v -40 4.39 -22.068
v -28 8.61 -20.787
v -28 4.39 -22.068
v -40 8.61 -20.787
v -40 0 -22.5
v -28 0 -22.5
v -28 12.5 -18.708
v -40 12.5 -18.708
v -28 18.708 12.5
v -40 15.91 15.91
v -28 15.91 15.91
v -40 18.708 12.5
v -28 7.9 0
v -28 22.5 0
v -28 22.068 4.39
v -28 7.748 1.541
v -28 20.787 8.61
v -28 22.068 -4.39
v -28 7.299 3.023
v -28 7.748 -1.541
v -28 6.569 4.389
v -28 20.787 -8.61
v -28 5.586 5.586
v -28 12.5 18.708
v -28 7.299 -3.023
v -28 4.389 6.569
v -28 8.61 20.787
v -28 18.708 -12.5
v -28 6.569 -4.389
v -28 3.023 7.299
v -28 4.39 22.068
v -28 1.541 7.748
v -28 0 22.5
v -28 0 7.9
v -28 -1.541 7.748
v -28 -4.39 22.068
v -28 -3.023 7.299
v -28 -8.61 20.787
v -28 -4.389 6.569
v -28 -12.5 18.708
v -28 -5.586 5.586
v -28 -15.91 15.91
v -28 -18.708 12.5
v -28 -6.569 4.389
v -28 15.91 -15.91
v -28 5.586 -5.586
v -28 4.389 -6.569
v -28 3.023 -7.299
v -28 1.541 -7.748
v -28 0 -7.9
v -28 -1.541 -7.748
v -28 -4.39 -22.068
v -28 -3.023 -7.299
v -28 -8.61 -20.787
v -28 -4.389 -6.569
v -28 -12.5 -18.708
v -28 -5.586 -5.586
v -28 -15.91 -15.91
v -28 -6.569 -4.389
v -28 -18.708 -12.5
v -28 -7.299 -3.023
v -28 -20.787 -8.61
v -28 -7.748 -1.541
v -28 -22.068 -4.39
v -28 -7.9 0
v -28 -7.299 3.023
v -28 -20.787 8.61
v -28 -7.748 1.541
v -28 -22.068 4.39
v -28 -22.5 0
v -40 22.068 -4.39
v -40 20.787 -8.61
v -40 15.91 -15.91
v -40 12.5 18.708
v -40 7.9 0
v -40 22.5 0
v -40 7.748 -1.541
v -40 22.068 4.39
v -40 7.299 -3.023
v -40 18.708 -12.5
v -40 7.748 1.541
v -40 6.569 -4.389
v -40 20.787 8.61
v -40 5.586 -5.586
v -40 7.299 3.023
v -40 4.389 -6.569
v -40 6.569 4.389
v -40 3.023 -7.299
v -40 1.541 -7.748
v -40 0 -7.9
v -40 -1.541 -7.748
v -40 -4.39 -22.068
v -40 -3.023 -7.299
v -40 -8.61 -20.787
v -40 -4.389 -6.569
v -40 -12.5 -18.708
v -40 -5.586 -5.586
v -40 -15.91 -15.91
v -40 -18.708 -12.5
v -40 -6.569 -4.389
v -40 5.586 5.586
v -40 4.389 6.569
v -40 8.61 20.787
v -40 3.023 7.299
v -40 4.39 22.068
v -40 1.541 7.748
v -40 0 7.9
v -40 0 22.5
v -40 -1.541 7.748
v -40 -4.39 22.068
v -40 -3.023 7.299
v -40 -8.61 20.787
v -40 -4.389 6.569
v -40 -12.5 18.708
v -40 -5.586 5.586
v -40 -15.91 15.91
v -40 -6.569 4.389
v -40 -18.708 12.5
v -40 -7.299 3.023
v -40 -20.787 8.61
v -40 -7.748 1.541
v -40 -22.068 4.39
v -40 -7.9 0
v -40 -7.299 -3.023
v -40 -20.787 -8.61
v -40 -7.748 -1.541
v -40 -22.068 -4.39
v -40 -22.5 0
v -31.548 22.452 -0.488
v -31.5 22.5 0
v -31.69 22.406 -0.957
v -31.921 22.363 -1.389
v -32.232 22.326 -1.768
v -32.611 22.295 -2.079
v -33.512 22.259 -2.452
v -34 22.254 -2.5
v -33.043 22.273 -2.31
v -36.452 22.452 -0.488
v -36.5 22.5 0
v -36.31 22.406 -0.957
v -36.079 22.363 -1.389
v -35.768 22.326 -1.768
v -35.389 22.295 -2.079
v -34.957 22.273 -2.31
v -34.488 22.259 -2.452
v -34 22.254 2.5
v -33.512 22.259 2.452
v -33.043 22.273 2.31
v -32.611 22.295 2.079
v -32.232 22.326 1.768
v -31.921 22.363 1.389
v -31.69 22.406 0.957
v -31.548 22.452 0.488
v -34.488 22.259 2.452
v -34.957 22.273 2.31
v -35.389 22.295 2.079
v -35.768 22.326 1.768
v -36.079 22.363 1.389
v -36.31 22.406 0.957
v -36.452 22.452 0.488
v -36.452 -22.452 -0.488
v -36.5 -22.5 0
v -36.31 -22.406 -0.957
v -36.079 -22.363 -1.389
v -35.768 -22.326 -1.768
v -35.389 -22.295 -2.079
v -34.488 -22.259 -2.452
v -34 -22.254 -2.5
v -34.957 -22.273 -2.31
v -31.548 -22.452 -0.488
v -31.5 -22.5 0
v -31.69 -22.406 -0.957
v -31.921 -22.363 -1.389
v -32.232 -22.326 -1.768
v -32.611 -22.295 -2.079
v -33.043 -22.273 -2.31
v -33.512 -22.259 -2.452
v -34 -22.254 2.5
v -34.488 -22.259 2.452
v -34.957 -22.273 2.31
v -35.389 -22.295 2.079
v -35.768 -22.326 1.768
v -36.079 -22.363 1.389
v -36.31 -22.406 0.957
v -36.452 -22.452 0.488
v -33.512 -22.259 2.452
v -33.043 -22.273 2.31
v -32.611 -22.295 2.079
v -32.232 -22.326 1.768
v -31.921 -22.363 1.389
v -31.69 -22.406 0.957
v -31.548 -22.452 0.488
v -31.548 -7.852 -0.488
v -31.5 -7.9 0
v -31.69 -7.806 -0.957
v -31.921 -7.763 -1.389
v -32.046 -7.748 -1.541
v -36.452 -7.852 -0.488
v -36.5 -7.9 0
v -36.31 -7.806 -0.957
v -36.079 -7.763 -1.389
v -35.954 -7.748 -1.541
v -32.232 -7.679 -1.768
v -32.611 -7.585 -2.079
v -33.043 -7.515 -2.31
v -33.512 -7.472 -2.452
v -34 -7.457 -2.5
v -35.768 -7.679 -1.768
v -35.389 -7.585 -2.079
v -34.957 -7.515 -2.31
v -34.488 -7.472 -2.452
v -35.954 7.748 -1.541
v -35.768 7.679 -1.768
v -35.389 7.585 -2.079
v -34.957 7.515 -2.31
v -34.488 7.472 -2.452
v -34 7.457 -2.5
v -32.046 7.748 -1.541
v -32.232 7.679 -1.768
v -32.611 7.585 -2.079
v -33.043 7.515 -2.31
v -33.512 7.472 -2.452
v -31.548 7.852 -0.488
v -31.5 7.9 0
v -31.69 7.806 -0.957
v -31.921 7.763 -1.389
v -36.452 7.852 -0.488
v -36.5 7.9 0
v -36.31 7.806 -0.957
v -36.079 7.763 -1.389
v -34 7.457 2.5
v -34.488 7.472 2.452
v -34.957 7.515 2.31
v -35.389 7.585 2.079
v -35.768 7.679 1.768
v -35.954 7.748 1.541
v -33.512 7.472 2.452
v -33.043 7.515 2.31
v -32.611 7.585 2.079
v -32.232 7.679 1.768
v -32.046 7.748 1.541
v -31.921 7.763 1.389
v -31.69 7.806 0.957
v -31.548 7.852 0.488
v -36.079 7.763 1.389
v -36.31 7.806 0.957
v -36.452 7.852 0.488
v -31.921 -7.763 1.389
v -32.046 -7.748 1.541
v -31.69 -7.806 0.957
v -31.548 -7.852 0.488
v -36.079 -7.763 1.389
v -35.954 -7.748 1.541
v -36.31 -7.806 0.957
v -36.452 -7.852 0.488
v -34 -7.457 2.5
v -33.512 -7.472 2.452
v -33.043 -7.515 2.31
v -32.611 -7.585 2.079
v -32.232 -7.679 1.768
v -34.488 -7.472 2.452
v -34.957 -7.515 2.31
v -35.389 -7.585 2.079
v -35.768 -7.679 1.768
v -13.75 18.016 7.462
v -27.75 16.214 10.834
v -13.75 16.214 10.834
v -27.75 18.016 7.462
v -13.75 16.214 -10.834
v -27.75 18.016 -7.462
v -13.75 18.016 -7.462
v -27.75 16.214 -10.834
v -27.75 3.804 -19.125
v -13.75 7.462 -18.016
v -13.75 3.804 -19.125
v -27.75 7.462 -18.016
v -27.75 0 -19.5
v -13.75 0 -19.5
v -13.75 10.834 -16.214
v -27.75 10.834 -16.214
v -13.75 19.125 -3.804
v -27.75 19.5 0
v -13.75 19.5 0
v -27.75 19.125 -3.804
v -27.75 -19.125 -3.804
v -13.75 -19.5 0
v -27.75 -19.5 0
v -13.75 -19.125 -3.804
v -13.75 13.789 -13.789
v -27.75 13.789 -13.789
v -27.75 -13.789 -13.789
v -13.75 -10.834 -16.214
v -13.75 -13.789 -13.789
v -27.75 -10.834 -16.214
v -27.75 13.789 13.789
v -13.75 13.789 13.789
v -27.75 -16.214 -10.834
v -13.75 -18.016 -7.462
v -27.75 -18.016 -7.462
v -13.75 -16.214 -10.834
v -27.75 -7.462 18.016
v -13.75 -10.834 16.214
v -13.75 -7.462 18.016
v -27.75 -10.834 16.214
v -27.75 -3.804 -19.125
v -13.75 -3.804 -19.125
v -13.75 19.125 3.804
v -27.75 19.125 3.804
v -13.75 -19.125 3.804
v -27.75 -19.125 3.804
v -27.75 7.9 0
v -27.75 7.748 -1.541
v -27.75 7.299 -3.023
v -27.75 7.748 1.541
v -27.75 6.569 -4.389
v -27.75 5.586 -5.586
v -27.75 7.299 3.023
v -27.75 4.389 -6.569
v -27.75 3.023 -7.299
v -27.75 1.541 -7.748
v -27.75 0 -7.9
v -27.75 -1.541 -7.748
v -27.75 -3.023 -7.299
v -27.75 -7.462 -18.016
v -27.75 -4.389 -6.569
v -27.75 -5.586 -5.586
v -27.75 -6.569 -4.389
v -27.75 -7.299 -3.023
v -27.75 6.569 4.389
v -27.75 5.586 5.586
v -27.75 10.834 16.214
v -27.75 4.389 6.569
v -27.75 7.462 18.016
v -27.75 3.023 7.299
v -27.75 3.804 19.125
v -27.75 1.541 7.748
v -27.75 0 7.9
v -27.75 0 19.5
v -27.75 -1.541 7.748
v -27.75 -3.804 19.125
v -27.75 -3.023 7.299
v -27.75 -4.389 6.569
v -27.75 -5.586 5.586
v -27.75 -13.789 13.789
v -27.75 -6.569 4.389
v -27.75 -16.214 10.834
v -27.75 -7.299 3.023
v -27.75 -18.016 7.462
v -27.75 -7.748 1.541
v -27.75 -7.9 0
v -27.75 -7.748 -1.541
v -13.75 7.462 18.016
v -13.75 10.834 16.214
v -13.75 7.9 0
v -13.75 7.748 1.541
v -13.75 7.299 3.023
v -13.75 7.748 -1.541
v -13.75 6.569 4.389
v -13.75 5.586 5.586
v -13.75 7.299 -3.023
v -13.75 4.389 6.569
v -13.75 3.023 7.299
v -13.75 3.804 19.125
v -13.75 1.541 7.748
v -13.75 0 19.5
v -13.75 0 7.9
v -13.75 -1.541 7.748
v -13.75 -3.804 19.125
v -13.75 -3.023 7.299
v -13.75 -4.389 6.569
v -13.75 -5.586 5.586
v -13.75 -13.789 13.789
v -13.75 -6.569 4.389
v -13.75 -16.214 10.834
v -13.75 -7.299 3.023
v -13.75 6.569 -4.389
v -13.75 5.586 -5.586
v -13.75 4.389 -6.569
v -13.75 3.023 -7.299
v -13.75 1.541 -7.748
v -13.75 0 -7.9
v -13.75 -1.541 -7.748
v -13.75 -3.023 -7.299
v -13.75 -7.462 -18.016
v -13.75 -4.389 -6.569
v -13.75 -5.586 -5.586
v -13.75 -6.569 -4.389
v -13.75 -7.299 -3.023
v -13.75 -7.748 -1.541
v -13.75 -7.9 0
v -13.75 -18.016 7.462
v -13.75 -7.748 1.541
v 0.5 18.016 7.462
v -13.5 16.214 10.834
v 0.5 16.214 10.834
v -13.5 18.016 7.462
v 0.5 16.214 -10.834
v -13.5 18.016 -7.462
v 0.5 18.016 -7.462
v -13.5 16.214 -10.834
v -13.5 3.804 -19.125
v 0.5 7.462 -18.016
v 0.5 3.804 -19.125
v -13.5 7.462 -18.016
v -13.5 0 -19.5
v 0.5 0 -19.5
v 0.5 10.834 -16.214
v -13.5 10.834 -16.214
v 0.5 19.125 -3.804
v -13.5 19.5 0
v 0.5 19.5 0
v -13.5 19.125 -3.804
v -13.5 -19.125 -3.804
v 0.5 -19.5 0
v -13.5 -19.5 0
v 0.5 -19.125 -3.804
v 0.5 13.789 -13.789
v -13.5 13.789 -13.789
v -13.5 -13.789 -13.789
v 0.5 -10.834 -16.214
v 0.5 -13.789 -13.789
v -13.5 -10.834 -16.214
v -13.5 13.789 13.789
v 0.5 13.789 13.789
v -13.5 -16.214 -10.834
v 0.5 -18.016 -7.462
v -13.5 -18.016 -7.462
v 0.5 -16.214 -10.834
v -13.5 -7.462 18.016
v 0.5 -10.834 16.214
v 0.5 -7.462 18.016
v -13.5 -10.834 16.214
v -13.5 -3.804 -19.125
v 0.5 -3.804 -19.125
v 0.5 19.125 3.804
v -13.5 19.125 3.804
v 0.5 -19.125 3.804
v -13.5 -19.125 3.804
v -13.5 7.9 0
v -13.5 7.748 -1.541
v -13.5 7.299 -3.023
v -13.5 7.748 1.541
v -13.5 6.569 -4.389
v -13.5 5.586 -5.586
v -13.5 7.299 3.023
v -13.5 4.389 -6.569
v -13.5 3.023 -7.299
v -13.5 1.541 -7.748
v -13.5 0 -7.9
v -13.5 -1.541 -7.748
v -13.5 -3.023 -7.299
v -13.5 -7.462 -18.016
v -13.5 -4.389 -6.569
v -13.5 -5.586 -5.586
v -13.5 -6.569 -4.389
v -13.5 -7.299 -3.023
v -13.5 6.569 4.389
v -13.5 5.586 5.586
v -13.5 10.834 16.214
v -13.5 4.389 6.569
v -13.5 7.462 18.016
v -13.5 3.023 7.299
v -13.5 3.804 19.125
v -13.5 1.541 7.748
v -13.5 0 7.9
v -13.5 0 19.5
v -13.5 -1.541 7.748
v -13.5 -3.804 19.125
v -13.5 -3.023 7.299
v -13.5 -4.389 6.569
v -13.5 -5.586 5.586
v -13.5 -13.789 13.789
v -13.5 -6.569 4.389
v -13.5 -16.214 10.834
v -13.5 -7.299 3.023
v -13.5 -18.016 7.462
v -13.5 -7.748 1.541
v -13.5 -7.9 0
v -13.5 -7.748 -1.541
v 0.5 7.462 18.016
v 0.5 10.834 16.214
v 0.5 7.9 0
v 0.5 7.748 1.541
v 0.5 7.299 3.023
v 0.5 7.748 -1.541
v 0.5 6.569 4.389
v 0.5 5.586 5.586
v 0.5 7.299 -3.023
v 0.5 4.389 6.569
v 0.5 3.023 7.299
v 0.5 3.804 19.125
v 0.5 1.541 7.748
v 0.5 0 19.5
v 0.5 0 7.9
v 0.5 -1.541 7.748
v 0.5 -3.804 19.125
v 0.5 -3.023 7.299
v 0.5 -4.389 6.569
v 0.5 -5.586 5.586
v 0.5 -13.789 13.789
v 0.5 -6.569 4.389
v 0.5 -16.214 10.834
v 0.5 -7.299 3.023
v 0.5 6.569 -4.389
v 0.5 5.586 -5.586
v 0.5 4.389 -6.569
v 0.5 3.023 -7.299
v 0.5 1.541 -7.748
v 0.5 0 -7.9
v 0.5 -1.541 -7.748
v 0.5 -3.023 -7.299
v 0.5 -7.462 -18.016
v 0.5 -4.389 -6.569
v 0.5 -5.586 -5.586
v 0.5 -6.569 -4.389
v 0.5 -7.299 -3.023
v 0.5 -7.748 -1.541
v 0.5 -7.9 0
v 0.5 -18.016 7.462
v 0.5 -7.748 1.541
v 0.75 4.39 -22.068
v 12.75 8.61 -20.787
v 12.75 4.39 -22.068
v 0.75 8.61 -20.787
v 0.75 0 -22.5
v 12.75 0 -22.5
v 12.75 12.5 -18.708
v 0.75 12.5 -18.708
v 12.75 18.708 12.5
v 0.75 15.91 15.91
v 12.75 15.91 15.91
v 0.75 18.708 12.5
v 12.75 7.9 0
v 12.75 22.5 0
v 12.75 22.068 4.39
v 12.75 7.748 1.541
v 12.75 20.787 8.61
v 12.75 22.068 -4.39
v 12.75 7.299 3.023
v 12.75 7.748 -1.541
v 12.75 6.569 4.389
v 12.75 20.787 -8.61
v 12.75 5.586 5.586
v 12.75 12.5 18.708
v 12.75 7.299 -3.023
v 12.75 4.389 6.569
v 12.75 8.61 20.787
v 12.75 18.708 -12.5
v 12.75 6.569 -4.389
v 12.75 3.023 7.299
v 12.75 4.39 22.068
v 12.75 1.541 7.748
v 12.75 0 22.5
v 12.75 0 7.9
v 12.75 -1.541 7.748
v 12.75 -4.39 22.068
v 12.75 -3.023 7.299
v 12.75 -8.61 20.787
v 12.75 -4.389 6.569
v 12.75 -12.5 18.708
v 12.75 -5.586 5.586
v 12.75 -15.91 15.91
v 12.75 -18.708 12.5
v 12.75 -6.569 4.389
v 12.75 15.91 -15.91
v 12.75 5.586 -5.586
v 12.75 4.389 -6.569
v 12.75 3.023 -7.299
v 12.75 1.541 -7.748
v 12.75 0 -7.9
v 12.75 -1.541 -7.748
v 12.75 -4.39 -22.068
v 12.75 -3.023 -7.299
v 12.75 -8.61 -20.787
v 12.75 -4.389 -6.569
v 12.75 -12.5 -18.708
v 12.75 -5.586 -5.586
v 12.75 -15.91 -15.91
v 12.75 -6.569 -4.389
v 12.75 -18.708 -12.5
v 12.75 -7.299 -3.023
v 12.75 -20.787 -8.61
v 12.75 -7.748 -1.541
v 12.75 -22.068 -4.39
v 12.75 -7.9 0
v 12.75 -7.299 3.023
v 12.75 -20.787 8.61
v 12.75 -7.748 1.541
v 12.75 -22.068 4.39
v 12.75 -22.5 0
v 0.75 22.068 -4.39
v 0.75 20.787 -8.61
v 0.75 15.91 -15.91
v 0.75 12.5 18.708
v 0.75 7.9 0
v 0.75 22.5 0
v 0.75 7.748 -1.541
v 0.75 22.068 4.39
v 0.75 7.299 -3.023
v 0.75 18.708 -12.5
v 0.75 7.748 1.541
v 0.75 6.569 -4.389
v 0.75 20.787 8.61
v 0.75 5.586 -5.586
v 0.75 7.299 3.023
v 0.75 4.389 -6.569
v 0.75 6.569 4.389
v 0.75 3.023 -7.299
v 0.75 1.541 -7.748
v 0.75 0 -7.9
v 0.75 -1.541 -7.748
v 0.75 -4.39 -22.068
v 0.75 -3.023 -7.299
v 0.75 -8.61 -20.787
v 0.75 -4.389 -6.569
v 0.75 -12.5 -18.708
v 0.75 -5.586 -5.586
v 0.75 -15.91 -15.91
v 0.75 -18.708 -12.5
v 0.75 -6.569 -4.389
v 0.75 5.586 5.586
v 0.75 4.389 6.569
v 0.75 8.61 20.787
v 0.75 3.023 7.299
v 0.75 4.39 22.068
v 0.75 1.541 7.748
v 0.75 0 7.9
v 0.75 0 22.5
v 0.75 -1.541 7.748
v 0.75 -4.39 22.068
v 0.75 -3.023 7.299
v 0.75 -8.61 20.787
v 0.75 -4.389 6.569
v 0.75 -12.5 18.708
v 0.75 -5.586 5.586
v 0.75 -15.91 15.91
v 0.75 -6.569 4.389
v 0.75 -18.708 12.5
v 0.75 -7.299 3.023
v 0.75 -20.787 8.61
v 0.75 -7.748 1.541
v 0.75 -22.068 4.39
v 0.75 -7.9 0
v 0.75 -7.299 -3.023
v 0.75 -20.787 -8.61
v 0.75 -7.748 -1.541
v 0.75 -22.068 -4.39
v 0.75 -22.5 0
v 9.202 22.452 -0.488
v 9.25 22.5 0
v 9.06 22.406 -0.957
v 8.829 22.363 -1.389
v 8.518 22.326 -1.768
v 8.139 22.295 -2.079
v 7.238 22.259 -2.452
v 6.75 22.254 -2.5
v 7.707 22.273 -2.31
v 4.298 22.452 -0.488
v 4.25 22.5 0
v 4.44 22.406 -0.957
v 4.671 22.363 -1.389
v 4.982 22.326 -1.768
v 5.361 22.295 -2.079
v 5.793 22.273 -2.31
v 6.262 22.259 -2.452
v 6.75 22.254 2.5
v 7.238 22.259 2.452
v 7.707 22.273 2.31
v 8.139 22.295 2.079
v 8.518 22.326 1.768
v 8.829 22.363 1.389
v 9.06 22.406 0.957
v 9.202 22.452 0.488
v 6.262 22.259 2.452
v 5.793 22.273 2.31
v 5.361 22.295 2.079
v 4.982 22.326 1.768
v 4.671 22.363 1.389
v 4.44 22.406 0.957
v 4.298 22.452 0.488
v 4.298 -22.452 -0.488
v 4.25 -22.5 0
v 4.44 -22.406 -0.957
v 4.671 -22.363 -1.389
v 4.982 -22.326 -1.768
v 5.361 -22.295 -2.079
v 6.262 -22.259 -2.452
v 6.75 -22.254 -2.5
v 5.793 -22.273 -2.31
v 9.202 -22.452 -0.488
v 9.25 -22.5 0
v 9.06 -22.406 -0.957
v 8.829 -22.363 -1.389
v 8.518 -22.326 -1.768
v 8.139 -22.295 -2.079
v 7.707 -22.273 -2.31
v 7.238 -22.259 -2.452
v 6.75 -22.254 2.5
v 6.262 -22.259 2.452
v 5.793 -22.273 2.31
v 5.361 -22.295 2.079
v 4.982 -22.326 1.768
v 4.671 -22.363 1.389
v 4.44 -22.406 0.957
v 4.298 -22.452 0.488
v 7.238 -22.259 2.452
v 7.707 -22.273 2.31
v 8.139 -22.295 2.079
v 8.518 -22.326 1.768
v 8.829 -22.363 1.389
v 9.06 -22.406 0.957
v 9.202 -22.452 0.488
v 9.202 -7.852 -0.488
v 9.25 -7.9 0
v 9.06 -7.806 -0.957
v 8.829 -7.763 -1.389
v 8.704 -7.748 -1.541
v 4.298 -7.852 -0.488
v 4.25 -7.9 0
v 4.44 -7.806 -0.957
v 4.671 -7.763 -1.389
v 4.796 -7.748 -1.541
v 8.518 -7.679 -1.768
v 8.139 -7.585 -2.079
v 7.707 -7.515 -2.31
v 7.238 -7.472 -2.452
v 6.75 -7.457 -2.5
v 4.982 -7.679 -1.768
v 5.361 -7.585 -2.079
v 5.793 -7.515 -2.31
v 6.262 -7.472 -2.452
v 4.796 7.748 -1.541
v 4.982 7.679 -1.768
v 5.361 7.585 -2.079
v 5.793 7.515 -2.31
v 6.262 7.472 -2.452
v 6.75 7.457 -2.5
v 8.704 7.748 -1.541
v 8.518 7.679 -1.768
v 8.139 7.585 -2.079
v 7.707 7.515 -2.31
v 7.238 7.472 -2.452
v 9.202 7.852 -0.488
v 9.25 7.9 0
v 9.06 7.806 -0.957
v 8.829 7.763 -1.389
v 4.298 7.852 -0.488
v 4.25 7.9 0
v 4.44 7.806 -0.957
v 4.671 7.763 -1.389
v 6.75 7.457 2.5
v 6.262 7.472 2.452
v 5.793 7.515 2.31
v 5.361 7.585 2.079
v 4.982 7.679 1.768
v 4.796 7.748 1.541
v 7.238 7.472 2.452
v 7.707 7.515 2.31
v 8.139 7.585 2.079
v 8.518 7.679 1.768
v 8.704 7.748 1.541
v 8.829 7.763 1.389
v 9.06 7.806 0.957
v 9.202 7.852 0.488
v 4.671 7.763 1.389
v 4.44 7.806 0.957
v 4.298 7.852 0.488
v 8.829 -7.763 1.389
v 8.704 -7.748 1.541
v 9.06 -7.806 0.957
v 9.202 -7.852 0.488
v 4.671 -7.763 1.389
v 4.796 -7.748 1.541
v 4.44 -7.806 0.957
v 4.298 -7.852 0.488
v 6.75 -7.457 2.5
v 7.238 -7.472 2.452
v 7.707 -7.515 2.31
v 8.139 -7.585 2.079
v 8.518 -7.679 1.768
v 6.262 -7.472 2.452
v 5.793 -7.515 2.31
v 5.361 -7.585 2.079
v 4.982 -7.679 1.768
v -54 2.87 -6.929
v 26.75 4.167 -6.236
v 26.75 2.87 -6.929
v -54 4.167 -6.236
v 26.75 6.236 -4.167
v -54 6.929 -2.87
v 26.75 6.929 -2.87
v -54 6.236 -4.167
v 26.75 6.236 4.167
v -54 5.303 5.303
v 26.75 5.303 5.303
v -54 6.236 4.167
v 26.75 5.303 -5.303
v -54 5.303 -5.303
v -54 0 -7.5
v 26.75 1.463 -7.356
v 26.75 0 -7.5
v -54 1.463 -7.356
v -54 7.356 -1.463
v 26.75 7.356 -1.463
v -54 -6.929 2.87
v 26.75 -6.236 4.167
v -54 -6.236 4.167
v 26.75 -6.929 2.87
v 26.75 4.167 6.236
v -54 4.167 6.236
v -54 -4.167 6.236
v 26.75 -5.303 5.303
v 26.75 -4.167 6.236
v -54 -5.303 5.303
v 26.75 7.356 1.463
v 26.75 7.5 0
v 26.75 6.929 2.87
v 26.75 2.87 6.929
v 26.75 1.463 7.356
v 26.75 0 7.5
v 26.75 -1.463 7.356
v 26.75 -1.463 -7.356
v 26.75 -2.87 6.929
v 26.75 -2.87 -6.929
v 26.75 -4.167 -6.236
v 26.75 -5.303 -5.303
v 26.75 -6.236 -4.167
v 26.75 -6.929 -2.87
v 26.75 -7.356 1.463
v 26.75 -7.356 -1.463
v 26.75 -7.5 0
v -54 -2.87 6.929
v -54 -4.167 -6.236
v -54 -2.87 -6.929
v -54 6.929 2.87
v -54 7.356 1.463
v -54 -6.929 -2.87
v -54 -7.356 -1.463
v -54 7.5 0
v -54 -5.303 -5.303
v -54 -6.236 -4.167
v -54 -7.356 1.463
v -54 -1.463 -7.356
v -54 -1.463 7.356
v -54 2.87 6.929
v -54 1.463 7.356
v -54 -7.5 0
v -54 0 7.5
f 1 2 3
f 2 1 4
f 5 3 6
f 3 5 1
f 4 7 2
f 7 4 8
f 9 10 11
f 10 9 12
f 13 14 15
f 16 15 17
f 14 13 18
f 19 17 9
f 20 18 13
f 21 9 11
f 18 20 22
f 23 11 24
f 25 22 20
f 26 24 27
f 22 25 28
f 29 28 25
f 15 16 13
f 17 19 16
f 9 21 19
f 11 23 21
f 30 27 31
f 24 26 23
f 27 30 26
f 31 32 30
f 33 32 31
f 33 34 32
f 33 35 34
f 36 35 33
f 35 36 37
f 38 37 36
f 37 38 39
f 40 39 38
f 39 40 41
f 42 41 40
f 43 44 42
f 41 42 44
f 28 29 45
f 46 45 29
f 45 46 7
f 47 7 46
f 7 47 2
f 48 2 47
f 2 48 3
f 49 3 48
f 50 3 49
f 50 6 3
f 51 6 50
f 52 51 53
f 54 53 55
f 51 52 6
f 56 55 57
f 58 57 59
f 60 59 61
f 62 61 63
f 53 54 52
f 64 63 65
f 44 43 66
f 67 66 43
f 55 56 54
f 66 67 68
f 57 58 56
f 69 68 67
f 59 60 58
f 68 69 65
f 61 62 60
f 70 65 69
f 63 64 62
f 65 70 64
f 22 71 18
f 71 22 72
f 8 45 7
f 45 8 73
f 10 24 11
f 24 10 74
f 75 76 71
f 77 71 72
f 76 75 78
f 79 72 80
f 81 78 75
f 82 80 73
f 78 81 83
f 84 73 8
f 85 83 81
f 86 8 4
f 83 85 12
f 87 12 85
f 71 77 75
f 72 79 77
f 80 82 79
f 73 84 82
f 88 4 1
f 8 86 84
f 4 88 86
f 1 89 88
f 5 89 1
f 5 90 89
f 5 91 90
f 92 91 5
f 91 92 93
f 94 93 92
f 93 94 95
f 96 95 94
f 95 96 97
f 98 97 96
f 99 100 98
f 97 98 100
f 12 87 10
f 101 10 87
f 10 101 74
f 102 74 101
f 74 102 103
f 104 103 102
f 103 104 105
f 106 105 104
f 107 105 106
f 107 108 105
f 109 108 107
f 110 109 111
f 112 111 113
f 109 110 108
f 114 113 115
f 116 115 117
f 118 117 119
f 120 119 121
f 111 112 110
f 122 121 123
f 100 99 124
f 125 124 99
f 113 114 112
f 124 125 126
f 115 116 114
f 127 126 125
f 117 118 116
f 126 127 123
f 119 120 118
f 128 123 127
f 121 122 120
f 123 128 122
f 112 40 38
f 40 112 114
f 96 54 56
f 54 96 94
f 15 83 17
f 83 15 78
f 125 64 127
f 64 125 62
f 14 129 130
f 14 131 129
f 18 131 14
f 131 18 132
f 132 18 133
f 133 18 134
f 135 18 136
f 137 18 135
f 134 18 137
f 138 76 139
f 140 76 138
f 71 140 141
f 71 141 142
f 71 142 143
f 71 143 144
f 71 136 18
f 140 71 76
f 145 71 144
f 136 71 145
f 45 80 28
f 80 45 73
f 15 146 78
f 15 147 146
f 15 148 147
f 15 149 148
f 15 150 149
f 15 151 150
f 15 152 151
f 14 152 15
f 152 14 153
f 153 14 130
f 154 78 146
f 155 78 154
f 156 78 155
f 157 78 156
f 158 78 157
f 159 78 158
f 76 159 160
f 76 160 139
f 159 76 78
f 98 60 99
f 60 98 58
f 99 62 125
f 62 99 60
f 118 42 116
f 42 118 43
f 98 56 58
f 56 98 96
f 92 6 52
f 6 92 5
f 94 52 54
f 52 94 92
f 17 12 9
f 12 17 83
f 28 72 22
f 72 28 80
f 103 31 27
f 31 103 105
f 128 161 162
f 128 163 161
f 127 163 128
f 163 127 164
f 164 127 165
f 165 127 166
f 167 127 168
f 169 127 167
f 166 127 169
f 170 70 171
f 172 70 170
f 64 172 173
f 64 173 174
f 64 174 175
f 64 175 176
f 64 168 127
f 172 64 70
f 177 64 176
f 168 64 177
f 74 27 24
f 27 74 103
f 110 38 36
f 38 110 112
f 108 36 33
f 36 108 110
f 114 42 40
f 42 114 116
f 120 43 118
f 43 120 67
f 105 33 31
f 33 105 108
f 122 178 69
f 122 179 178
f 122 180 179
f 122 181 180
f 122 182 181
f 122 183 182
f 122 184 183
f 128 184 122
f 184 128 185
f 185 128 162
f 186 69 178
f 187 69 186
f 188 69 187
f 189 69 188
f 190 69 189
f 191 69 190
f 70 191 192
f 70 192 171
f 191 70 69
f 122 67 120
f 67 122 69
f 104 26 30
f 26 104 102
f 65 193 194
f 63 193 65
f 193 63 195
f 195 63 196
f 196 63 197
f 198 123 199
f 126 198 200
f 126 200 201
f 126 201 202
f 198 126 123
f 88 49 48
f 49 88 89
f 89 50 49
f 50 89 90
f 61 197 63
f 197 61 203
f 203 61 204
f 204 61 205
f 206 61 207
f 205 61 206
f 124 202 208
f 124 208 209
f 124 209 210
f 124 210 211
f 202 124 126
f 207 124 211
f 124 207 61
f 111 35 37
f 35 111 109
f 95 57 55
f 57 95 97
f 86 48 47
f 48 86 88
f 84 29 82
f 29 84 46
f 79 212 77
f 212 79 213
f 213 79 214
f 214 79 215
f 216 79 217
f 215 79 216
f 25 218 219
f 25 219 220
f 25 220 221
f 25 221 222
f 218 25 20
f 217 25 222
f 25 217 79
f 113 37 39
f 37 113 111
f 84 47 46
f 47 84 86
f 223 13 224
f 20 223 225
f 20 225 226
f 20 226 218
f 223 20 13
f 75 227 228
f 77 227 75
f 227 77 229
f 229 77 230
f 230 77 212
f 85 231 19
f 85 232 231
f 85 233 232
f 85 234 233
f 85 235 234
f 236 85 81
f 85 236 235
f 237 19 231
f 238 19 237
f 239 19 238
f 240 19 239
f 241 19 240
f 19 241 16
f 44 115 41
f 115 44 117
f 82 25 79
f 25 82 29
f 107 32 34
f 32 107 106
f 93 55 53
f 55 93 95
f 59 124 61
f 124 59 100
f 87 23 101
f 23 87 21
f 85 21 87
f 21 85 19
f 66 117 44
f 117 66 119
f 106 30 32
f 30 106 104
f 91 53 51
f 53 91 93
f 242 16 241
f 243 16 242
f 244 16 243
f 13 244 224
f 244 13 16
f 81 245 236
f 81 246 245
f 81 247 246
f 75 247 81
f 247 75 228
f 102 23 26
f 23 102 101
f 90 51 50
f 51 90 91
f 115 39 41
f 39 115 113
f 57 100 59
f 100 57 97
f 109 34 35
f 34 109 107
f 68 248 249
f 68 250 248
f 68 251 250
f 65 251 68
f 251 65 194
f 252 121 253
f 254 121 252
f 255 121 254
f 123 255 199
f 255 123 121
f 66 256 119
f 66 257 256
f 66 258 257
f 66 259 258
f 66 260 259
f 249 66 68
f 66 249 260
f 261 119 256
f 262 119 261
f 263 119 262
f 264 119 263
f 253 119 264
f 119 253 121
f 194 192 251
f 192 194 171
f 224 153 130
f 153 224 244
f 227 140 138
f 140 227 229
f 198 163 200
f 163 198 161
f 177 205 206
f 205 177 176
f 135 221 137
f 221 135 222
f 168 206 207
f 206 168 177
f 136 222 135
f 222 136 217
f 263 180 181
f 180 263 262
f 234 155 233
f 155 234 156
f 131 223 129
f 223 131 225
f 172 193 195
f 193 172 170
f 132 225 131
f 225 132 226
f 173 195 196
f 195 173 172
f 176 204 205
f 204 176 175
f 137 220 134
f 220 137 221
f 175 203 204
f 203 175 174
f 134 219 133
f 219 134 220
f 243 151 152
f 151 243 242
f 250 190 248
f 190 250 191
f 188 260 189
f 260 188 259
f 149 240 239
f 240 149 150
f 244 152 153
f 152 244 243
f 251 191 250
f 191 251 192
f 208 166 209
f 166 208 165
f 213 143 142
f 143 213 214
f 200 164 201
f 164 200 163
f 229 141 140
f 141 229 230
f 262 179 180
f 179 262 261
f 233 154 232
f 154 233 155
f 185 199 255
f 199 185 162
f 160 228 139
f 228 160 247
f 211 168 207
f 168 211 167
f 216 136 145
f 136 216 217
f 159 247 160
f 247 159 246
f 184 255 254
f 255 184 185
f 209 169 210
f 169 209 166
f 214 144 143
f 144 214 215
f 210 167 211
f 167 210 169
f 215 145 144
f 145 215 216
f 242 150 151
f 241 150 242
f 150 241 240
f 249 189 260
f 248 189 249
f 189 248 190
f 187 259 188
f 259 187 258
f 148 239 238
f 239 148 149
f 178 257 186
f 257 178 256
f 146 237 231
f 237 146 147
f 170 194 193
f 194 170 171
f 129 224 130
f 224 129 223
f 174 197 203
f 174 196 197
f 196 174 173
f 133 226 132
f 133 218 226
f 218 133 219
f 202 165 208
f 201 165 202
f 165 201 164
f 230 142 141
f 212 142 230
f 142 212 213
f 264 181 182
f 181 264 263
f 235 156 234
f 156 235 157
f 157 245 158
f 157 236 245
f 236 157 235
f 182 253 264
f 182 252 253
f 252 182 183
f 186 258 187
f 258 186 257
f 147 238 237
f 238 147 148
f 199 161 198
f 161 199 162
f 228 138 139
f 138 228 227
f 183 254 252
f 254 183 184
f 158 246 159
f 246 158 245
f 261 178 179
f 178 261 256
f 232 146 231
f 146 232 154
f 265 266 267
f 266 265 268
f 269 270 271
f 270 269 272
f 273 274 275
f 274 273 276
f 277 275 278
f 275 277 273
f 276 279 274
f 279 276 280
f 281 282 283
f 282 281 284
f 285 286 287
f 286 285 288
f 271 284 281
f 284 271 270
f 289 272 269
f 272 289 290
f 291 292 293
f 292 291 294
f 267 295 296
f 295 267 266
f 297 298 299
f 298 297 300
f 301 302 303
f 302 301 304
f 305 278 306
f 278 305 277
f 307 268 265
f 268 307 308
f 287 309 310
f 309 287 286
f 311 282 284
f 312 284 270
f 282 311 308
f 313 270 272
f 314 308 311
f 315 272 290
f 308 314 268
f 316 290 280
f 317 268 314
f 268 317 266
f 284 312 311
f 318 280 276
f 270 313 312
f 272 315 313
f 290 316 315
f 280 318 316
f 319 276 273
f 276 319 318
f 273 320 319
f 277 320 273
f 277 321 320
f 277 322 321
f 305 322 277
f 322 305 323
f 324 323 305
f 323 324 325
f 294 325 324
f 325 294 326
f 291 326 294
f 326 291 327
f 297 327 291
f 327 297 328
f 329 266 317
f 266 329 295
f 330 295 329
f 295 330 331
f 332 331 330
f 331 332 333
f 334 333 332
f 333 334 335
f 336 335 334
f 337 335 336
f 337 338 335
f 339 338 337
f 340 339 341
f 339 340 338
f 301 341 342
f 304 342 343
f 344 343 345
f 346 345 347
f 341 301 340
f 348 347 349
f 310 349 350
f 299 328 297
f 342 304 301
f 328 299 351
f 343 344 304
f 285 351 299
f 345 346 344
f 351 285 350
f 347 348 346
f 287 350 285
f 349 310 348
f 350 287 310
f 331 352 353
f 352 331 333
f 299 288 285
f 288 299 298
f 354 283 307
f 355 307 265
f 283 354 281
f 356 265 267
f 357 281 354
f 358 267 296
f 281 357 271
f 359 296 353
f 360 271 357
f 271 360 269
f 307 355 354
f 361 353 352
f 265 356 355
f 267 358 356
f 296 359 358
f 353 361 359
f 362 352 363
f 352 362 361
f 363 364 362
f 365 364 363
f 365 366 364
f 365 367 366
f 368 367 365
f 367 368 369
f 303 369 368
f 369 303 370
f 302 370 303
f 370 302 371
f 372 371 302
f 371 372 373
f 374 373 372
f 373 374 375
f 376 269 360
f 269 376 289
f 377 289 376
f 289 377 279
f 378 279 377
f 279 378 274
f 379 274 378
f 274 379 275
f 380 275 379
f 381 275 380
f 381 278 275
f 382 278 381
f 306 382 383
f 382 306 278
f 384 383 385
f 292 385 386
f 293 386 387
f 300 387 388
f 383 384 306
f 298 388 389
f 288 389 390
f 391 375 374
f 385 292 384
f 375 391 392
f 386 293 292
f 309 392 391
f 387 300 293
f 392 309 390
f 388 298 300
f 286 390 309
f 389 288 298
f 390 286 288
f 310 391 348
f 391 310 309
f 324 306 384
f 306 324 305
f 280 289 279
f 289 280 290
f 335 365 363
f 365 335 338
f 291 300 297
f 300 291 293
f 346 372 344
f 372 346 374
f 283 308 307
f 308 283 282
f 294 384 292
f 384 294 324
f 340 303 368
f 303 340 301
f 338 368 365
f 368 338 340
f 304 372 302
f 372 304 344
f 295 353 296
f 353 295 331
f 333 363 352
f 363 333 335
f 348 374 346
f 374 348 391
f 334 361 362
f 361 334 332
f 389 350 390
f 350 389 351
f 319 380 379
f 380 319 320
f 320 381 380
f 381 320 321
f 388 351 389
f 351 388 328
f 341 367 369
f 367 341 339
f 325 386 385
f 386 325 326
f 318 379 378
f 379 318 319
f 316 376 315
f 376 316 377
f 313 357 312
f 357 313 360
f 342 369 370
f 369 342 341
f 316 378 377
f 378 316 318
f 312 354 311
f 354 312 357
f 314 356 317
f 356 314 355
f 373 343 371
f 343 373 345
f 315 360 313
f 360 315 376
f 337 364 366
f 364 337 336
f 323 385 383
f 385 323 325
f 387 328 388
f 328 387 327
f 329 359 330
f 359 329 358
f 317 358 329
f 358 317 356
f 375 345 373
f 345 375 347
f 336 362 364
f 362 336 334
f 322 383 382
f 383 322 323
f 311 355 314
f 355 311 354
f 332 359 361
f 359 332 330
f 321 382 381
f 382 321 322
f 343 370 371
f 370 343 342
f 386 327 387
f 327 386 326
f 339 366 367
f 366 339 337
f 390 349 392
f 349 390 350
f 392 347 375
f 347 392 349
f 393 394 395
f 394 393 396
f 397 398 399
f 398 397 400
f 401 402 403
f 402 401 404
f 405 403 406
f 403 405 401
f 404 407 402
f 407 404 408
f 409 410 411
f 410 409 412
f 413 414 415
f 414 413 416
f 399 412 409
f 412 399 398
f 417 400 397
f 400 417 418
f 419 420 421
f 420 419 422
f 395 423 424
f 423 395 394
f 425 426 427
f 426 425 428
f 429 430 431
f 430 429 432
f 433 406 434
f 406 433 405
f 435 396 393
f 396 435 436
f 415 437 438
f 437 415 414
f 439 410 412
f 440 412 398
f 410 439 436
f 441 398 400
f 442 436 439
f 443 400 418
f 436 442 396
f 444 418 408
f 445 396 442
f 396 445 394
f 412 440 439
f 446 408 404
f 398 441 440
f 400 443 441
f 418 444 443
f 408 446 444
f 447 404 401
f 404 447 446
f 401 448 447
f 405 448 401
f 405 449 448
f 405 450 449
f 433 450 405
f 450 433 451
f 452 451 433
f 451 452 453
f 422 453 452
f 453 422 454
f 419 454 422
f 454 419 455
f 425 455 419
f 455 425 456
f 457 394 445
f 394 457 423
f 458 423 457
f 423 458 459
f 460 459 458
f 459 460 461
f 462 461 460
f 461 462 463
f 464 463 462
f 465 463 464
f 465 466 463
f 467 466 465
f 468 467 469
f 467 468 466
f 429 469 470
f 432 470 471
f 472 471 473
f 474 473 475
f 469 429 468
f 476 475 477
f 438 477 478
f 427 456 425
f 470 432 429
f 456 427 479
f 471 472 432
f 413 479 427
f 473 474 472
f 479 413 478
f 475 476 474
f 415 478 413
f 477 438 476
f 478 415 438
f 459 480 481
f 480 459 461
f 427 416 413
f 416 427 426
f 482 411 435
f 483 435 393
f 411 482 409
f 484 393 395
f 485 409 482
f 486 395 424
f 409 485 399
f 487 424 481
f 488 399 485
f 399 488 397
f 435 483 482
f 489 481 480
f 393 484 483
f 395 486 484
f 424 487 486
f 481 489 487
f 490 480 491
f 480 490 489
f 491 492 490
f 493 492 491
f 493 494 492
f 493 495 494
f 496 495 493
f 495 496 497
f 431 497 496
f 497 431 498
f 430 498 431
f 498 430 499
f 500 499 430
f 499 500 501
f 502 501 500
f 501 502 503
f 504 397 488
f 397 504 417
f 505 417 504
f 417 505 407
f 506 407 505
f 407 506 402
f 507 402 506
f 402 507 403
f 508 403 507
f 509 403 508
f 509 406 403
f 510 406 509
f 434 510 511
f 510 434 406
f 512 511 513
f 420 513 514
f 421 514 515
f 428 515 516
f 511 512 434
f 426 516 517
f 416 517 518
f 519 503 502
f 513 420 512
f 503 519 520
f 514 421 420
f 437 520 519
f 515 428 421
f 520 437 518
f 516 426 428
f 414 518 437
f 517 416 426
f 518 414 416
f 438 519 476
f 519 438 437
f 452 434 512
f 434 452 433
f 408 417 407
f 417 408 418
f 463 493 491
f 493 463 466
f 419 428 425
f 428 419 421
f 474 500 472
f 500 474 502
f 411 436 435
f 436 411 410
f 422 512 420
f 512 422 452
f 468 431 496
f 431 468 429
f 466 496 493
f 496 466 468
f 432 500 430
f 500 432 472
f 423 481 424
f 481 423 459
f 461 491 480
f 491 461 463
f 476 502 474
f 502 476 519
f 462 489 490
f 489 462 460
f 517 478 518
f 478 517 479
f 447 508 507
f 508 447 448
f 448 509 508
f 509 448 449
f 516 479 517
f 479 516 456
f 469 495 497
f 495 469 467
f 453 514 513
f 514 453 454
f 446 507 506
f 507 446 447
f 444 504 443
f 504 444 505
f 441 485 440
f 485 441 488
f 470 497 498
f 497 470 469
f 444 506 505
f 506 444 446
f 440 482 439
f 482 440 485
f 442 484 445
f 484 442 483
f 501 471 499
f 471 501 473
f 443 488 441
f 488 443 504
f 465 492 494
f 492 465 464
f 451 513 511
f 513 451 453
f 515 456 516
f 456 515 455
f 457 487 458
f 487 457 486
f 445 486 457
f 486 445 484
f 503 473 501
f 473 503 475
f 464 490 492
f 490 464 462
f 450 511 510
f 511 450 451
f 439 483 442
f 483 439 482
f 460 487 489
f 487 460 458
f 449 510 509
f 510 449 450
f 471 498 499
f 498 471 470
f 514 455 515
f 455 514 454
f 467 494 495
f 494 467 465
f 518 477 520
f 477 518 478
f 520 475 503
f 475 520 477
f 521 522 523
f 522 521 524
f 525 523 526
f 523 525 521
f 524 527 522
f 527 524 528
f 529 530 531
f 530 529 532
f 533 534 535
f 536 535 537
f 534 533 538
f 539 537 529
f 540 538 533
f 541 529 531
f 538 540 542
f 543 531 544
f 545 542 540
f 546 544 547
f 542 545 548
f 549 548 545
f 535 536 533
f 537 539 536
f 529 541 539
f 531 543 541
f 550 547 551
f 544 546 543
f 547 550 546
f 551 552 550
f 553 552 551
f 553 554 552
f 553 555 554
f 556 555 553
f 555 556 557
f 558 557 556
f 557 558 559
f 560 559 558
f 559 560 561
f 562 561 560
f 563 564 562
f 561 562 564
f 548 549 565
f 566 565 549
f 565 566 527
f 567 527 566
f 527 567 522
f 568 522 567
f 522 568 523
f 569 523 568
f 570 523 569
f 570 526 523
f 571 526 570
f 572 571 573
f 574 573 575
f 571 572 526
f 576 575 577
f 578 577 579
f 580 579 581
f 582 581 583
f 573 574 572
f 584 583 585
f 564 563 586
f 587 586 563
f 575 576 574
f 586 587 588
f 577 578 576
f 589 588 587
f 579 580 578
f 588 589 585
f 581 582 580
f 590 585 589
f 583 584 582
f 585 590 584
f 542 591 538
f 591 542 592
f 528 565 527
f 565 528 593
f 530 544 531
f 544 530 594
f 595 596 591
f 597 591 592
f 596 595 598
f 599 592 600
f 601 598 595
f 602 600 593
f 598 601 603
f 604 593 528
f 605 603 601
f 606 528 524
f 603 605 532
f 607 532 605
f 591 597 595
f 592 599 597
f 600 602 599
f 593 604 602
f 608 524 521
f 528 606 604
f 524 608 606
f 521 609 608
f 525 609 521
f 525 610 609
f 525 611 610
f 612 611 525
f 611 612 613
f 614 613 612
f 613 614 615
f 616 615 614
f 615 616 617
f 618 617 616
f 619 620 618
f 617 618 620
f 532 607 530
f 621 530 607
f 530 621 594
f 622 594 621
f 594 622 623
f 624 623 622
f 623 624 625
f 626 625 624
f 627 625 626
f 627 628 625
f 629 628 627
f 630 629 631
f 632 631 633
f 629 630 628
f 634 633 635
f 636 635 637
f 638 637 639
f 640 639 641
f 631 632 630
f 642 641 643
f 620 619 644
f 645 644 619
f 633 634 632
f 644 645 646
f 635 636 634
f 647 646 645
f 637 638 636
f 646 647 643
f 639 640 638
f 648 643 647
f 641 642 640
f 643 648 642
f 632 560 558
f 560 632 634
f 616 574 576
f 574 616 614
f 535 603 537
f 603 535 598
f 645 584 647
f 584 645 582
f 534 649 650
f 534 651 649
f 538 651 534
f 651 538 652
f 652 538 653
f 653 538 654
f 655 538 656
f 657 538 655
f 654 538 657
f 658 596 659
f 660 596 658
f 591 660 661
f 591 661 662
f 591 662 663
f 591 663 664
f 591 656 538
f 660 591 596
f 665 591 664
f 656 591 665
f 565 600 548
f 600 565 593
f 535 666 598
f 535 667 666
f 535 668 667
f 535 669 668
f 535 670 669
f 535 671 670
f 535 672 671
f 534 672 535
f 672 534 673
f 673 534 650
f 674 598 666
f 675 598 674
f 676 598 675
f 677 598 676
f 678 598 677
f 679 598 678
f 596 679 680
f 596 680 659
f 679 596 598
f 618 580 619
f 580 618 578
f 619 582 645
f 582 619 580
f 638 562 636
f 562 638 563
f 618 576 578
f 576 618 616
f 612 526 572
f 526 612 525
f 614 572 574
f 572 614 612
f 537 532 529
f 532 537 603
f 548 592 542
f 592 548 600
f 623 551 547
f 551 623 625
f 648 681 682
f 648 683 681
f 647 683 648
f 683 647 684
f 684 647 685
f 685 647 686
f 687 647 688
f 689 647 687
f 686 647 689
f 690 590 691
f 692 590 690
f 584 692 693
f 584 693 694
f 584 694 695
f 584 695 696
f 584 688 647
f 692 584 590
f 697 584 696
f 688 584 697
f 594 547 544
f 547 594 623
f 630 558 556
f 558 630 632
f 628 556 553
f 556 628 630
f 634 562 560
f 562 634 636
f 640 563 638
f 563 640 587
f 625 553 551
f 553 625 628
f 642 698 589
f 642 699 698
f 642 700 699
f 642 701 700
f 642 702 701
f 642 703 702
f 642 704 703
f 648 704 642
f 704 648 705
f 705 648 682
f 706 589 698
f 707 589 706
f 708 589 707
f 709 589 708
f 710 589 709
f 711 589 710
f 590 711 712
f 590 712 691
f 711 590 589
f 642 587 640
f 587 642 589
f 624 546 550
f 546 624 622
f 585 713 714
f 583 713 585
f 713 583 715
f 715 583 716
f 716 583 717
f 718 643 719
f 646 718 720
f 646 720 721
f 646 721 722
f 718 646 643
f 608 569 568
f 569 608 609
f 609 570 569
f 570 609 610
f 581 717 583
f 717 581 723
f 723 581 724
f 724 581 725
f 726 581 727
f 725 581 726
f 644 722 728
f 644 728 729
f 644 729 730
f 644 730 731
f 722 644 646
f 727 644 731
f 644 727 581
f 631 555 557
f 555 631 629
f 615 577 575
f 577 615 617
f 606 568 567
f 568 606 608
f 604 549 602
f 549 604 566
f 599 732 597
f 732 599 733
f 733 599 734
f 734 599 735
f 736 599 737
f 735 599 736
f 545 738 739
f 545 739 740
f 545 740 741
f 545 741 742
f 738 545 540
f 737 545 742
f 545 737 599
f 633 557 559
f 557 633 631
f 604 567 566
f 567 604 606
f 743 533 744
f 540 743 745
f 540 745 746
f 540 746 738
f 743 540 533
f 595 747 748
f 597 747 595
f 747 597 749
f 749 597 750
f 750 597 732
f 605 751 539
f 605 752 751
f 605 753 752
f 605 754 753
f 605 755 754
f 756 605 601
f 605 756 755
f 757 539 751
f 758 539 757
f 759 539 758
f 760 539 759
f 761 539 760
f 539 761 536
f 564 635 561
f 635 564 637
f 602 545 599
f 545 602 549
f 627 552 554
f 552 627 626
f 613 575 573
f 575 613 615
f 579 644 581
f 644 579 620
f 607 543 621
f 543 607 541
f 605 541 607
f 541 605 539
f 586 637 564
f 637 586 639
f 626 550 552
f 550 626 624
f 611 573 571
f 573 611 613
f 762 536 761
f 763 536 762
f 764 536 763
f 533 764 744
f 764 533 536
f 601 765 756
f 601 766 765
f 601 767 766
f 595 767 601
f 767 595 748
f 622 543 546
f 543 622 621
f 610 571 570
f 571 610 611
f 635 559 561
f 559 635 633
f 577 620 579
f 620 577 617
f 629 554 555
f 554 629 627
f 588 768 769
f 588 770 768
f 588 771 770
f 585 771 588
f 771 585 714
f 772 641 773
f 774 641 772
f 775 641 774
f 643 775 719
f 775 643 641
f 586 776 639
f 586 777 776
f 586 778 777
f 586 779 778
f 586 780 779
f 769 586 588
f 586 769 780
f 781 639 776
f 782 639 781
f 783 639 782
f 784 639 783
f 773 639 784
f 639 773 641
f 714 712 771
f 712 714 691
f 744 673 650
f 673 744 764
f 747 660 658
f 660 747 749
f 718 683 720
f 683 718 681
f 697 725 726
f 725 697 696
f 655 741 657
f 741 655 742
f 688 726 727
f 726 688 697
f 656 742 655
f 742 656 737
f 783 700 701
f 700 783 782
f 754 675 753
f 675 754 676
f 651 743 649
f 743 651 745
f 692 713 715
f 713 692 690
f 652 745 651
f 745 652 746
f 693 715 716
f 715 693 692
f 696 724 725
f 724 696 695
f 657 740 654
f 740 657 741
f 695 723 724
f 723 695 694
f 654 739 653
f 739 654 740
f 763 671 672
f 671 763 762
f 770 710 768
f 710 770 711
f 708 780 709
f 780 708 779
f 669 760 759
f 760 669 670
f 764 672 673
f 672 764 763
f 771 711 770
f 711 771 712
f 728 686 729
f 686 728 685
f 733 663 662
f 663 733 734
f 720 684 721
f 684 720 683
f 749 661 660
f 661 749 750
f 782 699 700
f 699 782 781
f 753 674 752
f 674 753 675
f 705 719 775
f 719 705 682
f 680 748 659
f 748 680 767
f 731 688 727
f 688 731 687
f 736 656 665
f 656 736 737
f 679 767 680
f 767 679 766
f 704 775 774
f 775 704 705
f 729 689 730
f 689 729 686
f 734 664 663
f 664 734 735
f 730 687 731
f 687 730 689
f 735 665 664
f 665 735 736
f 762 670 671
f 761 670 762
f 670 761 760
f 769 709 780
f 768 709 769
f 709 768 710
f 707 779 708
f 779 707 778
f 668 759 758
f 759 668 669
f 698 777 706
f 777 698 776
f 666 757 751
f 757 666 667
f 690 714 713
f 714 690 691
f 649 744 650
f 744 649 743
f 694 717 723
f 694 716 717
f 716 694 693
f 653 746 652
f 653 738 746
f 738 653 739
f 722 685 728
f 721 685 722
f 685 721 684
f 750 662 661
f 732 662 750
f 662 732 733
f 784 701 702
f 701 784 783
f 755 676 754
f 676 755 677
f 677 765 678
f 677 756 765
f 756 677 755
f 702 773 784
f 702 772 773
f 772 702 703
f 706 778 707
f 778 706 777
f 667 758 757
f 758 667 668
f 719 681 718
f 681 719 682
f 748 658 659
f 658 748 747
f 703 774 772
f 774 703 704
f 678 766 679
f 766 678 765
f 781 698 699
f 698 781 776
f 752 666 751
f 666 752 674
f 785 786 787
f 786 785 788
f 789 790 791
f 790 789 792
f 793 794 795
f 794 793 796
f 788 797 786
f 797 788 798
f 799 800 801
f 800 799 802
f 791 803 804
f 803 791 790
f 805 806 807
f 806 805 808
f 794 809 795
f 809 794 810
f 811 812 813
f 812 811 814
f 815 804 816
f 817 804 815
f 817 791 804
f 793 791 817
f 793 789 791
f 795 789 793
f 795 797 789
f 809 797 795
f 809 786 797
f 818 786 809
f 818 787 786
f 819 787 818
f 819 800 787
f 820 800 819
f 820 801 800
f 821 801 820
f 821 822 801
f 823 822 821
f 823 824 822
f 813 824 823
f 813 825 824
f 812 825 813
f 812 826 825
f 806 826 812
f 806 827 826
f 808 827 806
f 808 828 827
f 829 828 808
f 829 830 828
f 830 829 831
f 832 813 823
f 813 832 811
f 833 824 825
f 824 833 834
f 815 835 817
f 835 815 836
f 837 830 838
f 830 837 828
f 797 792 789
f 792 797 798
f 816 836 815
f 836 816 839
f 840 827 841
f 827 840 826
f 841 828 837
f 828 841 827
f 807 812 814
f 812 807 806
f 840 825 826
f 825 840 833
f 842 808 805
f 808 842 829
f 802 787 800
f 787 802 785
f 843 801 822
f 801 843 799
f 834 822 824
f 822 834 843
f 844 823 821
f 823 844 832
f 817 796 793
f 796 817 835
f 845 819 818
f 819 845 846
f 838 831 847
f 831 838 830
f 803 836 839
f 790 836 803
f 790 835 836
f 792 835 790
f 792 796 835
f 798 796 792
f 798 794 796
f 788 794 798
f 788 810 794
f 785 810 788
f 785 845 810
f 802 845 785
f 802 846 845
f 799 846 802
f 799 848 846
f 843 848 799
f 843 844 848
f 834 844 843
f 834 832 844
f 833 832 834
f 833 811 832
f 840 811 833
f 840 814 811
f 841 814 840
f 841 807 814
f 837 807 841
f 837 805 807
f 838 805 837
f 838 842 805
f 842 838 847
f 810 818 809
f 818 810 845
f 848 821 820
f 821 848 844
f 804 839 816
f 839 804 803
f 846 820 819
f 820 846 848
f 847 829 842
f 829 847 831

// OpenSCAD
$fn = 32;

// ------------------------------------------------------------------------
// Shaft with rings and collars: d15 shaft, 4 rings
// Every part is its own module, assembly() places them once.
// ------------------------------------------------------------------------

// --- part 1 ---
module shaft() {
  translate([0, 0, -40.375]) cylinder(h = 80.75, d = 15);
}

// --- part 2 ---
module collar_a() {
  difference() {
    cylinder(h = 12, d = 45);
    translate([0, 0, -1]) cylinder(h = 14, d = 15.8);
    translate([0, 0, 6]) rotate([90, 0, 0]) cylinder(h = 47, d = 5, center = true);
  }
}

// --- part 3 ---
module spacer_a() {
  difference() {
      translate([0, 0, 0]) cylinder(h = 14, d = 39);
      translate([0, 0, -1]) cylinder(h = 16, d = 15.8);
    }
}

// --- part 4 ---
module spacer_b() {
  difference() {
      translate([0, 0, 0]) cylinder(h = 14, d = 39);
      translate([0, 0, -1]) cylinder(h = 16, d = 15.8);
    }
}

// --- part 5 ---
module collar_b() {
  difference() {
    cylinder(h = 12, d = 45);
    translate([0, 0, -1]) cylinder(h = 14, d = 15.8);
    translate([0, 0, 6]) rotate([90, 0, 0]) cylinder(h = 47, d = 5, center = true);
  }
}

// --- assembly ---
module assembly() {
  translate([-13.625, 0, 0]) rotate([0, 90, 0]) shaft();
  translate([-40, 0, 0]) rotate([0, 90, 0]) collar_a();
  translate([-27.75, 0, 0]) rotate([0, 90, 0]) spacer_a();
  translate([-13.5, 0, 0]) rotate([0, 90, 0]) spacer_b();
  translate([0.75, 0, 0]) rotate([0, 90, 0]) collar_b();
}

assembly();
